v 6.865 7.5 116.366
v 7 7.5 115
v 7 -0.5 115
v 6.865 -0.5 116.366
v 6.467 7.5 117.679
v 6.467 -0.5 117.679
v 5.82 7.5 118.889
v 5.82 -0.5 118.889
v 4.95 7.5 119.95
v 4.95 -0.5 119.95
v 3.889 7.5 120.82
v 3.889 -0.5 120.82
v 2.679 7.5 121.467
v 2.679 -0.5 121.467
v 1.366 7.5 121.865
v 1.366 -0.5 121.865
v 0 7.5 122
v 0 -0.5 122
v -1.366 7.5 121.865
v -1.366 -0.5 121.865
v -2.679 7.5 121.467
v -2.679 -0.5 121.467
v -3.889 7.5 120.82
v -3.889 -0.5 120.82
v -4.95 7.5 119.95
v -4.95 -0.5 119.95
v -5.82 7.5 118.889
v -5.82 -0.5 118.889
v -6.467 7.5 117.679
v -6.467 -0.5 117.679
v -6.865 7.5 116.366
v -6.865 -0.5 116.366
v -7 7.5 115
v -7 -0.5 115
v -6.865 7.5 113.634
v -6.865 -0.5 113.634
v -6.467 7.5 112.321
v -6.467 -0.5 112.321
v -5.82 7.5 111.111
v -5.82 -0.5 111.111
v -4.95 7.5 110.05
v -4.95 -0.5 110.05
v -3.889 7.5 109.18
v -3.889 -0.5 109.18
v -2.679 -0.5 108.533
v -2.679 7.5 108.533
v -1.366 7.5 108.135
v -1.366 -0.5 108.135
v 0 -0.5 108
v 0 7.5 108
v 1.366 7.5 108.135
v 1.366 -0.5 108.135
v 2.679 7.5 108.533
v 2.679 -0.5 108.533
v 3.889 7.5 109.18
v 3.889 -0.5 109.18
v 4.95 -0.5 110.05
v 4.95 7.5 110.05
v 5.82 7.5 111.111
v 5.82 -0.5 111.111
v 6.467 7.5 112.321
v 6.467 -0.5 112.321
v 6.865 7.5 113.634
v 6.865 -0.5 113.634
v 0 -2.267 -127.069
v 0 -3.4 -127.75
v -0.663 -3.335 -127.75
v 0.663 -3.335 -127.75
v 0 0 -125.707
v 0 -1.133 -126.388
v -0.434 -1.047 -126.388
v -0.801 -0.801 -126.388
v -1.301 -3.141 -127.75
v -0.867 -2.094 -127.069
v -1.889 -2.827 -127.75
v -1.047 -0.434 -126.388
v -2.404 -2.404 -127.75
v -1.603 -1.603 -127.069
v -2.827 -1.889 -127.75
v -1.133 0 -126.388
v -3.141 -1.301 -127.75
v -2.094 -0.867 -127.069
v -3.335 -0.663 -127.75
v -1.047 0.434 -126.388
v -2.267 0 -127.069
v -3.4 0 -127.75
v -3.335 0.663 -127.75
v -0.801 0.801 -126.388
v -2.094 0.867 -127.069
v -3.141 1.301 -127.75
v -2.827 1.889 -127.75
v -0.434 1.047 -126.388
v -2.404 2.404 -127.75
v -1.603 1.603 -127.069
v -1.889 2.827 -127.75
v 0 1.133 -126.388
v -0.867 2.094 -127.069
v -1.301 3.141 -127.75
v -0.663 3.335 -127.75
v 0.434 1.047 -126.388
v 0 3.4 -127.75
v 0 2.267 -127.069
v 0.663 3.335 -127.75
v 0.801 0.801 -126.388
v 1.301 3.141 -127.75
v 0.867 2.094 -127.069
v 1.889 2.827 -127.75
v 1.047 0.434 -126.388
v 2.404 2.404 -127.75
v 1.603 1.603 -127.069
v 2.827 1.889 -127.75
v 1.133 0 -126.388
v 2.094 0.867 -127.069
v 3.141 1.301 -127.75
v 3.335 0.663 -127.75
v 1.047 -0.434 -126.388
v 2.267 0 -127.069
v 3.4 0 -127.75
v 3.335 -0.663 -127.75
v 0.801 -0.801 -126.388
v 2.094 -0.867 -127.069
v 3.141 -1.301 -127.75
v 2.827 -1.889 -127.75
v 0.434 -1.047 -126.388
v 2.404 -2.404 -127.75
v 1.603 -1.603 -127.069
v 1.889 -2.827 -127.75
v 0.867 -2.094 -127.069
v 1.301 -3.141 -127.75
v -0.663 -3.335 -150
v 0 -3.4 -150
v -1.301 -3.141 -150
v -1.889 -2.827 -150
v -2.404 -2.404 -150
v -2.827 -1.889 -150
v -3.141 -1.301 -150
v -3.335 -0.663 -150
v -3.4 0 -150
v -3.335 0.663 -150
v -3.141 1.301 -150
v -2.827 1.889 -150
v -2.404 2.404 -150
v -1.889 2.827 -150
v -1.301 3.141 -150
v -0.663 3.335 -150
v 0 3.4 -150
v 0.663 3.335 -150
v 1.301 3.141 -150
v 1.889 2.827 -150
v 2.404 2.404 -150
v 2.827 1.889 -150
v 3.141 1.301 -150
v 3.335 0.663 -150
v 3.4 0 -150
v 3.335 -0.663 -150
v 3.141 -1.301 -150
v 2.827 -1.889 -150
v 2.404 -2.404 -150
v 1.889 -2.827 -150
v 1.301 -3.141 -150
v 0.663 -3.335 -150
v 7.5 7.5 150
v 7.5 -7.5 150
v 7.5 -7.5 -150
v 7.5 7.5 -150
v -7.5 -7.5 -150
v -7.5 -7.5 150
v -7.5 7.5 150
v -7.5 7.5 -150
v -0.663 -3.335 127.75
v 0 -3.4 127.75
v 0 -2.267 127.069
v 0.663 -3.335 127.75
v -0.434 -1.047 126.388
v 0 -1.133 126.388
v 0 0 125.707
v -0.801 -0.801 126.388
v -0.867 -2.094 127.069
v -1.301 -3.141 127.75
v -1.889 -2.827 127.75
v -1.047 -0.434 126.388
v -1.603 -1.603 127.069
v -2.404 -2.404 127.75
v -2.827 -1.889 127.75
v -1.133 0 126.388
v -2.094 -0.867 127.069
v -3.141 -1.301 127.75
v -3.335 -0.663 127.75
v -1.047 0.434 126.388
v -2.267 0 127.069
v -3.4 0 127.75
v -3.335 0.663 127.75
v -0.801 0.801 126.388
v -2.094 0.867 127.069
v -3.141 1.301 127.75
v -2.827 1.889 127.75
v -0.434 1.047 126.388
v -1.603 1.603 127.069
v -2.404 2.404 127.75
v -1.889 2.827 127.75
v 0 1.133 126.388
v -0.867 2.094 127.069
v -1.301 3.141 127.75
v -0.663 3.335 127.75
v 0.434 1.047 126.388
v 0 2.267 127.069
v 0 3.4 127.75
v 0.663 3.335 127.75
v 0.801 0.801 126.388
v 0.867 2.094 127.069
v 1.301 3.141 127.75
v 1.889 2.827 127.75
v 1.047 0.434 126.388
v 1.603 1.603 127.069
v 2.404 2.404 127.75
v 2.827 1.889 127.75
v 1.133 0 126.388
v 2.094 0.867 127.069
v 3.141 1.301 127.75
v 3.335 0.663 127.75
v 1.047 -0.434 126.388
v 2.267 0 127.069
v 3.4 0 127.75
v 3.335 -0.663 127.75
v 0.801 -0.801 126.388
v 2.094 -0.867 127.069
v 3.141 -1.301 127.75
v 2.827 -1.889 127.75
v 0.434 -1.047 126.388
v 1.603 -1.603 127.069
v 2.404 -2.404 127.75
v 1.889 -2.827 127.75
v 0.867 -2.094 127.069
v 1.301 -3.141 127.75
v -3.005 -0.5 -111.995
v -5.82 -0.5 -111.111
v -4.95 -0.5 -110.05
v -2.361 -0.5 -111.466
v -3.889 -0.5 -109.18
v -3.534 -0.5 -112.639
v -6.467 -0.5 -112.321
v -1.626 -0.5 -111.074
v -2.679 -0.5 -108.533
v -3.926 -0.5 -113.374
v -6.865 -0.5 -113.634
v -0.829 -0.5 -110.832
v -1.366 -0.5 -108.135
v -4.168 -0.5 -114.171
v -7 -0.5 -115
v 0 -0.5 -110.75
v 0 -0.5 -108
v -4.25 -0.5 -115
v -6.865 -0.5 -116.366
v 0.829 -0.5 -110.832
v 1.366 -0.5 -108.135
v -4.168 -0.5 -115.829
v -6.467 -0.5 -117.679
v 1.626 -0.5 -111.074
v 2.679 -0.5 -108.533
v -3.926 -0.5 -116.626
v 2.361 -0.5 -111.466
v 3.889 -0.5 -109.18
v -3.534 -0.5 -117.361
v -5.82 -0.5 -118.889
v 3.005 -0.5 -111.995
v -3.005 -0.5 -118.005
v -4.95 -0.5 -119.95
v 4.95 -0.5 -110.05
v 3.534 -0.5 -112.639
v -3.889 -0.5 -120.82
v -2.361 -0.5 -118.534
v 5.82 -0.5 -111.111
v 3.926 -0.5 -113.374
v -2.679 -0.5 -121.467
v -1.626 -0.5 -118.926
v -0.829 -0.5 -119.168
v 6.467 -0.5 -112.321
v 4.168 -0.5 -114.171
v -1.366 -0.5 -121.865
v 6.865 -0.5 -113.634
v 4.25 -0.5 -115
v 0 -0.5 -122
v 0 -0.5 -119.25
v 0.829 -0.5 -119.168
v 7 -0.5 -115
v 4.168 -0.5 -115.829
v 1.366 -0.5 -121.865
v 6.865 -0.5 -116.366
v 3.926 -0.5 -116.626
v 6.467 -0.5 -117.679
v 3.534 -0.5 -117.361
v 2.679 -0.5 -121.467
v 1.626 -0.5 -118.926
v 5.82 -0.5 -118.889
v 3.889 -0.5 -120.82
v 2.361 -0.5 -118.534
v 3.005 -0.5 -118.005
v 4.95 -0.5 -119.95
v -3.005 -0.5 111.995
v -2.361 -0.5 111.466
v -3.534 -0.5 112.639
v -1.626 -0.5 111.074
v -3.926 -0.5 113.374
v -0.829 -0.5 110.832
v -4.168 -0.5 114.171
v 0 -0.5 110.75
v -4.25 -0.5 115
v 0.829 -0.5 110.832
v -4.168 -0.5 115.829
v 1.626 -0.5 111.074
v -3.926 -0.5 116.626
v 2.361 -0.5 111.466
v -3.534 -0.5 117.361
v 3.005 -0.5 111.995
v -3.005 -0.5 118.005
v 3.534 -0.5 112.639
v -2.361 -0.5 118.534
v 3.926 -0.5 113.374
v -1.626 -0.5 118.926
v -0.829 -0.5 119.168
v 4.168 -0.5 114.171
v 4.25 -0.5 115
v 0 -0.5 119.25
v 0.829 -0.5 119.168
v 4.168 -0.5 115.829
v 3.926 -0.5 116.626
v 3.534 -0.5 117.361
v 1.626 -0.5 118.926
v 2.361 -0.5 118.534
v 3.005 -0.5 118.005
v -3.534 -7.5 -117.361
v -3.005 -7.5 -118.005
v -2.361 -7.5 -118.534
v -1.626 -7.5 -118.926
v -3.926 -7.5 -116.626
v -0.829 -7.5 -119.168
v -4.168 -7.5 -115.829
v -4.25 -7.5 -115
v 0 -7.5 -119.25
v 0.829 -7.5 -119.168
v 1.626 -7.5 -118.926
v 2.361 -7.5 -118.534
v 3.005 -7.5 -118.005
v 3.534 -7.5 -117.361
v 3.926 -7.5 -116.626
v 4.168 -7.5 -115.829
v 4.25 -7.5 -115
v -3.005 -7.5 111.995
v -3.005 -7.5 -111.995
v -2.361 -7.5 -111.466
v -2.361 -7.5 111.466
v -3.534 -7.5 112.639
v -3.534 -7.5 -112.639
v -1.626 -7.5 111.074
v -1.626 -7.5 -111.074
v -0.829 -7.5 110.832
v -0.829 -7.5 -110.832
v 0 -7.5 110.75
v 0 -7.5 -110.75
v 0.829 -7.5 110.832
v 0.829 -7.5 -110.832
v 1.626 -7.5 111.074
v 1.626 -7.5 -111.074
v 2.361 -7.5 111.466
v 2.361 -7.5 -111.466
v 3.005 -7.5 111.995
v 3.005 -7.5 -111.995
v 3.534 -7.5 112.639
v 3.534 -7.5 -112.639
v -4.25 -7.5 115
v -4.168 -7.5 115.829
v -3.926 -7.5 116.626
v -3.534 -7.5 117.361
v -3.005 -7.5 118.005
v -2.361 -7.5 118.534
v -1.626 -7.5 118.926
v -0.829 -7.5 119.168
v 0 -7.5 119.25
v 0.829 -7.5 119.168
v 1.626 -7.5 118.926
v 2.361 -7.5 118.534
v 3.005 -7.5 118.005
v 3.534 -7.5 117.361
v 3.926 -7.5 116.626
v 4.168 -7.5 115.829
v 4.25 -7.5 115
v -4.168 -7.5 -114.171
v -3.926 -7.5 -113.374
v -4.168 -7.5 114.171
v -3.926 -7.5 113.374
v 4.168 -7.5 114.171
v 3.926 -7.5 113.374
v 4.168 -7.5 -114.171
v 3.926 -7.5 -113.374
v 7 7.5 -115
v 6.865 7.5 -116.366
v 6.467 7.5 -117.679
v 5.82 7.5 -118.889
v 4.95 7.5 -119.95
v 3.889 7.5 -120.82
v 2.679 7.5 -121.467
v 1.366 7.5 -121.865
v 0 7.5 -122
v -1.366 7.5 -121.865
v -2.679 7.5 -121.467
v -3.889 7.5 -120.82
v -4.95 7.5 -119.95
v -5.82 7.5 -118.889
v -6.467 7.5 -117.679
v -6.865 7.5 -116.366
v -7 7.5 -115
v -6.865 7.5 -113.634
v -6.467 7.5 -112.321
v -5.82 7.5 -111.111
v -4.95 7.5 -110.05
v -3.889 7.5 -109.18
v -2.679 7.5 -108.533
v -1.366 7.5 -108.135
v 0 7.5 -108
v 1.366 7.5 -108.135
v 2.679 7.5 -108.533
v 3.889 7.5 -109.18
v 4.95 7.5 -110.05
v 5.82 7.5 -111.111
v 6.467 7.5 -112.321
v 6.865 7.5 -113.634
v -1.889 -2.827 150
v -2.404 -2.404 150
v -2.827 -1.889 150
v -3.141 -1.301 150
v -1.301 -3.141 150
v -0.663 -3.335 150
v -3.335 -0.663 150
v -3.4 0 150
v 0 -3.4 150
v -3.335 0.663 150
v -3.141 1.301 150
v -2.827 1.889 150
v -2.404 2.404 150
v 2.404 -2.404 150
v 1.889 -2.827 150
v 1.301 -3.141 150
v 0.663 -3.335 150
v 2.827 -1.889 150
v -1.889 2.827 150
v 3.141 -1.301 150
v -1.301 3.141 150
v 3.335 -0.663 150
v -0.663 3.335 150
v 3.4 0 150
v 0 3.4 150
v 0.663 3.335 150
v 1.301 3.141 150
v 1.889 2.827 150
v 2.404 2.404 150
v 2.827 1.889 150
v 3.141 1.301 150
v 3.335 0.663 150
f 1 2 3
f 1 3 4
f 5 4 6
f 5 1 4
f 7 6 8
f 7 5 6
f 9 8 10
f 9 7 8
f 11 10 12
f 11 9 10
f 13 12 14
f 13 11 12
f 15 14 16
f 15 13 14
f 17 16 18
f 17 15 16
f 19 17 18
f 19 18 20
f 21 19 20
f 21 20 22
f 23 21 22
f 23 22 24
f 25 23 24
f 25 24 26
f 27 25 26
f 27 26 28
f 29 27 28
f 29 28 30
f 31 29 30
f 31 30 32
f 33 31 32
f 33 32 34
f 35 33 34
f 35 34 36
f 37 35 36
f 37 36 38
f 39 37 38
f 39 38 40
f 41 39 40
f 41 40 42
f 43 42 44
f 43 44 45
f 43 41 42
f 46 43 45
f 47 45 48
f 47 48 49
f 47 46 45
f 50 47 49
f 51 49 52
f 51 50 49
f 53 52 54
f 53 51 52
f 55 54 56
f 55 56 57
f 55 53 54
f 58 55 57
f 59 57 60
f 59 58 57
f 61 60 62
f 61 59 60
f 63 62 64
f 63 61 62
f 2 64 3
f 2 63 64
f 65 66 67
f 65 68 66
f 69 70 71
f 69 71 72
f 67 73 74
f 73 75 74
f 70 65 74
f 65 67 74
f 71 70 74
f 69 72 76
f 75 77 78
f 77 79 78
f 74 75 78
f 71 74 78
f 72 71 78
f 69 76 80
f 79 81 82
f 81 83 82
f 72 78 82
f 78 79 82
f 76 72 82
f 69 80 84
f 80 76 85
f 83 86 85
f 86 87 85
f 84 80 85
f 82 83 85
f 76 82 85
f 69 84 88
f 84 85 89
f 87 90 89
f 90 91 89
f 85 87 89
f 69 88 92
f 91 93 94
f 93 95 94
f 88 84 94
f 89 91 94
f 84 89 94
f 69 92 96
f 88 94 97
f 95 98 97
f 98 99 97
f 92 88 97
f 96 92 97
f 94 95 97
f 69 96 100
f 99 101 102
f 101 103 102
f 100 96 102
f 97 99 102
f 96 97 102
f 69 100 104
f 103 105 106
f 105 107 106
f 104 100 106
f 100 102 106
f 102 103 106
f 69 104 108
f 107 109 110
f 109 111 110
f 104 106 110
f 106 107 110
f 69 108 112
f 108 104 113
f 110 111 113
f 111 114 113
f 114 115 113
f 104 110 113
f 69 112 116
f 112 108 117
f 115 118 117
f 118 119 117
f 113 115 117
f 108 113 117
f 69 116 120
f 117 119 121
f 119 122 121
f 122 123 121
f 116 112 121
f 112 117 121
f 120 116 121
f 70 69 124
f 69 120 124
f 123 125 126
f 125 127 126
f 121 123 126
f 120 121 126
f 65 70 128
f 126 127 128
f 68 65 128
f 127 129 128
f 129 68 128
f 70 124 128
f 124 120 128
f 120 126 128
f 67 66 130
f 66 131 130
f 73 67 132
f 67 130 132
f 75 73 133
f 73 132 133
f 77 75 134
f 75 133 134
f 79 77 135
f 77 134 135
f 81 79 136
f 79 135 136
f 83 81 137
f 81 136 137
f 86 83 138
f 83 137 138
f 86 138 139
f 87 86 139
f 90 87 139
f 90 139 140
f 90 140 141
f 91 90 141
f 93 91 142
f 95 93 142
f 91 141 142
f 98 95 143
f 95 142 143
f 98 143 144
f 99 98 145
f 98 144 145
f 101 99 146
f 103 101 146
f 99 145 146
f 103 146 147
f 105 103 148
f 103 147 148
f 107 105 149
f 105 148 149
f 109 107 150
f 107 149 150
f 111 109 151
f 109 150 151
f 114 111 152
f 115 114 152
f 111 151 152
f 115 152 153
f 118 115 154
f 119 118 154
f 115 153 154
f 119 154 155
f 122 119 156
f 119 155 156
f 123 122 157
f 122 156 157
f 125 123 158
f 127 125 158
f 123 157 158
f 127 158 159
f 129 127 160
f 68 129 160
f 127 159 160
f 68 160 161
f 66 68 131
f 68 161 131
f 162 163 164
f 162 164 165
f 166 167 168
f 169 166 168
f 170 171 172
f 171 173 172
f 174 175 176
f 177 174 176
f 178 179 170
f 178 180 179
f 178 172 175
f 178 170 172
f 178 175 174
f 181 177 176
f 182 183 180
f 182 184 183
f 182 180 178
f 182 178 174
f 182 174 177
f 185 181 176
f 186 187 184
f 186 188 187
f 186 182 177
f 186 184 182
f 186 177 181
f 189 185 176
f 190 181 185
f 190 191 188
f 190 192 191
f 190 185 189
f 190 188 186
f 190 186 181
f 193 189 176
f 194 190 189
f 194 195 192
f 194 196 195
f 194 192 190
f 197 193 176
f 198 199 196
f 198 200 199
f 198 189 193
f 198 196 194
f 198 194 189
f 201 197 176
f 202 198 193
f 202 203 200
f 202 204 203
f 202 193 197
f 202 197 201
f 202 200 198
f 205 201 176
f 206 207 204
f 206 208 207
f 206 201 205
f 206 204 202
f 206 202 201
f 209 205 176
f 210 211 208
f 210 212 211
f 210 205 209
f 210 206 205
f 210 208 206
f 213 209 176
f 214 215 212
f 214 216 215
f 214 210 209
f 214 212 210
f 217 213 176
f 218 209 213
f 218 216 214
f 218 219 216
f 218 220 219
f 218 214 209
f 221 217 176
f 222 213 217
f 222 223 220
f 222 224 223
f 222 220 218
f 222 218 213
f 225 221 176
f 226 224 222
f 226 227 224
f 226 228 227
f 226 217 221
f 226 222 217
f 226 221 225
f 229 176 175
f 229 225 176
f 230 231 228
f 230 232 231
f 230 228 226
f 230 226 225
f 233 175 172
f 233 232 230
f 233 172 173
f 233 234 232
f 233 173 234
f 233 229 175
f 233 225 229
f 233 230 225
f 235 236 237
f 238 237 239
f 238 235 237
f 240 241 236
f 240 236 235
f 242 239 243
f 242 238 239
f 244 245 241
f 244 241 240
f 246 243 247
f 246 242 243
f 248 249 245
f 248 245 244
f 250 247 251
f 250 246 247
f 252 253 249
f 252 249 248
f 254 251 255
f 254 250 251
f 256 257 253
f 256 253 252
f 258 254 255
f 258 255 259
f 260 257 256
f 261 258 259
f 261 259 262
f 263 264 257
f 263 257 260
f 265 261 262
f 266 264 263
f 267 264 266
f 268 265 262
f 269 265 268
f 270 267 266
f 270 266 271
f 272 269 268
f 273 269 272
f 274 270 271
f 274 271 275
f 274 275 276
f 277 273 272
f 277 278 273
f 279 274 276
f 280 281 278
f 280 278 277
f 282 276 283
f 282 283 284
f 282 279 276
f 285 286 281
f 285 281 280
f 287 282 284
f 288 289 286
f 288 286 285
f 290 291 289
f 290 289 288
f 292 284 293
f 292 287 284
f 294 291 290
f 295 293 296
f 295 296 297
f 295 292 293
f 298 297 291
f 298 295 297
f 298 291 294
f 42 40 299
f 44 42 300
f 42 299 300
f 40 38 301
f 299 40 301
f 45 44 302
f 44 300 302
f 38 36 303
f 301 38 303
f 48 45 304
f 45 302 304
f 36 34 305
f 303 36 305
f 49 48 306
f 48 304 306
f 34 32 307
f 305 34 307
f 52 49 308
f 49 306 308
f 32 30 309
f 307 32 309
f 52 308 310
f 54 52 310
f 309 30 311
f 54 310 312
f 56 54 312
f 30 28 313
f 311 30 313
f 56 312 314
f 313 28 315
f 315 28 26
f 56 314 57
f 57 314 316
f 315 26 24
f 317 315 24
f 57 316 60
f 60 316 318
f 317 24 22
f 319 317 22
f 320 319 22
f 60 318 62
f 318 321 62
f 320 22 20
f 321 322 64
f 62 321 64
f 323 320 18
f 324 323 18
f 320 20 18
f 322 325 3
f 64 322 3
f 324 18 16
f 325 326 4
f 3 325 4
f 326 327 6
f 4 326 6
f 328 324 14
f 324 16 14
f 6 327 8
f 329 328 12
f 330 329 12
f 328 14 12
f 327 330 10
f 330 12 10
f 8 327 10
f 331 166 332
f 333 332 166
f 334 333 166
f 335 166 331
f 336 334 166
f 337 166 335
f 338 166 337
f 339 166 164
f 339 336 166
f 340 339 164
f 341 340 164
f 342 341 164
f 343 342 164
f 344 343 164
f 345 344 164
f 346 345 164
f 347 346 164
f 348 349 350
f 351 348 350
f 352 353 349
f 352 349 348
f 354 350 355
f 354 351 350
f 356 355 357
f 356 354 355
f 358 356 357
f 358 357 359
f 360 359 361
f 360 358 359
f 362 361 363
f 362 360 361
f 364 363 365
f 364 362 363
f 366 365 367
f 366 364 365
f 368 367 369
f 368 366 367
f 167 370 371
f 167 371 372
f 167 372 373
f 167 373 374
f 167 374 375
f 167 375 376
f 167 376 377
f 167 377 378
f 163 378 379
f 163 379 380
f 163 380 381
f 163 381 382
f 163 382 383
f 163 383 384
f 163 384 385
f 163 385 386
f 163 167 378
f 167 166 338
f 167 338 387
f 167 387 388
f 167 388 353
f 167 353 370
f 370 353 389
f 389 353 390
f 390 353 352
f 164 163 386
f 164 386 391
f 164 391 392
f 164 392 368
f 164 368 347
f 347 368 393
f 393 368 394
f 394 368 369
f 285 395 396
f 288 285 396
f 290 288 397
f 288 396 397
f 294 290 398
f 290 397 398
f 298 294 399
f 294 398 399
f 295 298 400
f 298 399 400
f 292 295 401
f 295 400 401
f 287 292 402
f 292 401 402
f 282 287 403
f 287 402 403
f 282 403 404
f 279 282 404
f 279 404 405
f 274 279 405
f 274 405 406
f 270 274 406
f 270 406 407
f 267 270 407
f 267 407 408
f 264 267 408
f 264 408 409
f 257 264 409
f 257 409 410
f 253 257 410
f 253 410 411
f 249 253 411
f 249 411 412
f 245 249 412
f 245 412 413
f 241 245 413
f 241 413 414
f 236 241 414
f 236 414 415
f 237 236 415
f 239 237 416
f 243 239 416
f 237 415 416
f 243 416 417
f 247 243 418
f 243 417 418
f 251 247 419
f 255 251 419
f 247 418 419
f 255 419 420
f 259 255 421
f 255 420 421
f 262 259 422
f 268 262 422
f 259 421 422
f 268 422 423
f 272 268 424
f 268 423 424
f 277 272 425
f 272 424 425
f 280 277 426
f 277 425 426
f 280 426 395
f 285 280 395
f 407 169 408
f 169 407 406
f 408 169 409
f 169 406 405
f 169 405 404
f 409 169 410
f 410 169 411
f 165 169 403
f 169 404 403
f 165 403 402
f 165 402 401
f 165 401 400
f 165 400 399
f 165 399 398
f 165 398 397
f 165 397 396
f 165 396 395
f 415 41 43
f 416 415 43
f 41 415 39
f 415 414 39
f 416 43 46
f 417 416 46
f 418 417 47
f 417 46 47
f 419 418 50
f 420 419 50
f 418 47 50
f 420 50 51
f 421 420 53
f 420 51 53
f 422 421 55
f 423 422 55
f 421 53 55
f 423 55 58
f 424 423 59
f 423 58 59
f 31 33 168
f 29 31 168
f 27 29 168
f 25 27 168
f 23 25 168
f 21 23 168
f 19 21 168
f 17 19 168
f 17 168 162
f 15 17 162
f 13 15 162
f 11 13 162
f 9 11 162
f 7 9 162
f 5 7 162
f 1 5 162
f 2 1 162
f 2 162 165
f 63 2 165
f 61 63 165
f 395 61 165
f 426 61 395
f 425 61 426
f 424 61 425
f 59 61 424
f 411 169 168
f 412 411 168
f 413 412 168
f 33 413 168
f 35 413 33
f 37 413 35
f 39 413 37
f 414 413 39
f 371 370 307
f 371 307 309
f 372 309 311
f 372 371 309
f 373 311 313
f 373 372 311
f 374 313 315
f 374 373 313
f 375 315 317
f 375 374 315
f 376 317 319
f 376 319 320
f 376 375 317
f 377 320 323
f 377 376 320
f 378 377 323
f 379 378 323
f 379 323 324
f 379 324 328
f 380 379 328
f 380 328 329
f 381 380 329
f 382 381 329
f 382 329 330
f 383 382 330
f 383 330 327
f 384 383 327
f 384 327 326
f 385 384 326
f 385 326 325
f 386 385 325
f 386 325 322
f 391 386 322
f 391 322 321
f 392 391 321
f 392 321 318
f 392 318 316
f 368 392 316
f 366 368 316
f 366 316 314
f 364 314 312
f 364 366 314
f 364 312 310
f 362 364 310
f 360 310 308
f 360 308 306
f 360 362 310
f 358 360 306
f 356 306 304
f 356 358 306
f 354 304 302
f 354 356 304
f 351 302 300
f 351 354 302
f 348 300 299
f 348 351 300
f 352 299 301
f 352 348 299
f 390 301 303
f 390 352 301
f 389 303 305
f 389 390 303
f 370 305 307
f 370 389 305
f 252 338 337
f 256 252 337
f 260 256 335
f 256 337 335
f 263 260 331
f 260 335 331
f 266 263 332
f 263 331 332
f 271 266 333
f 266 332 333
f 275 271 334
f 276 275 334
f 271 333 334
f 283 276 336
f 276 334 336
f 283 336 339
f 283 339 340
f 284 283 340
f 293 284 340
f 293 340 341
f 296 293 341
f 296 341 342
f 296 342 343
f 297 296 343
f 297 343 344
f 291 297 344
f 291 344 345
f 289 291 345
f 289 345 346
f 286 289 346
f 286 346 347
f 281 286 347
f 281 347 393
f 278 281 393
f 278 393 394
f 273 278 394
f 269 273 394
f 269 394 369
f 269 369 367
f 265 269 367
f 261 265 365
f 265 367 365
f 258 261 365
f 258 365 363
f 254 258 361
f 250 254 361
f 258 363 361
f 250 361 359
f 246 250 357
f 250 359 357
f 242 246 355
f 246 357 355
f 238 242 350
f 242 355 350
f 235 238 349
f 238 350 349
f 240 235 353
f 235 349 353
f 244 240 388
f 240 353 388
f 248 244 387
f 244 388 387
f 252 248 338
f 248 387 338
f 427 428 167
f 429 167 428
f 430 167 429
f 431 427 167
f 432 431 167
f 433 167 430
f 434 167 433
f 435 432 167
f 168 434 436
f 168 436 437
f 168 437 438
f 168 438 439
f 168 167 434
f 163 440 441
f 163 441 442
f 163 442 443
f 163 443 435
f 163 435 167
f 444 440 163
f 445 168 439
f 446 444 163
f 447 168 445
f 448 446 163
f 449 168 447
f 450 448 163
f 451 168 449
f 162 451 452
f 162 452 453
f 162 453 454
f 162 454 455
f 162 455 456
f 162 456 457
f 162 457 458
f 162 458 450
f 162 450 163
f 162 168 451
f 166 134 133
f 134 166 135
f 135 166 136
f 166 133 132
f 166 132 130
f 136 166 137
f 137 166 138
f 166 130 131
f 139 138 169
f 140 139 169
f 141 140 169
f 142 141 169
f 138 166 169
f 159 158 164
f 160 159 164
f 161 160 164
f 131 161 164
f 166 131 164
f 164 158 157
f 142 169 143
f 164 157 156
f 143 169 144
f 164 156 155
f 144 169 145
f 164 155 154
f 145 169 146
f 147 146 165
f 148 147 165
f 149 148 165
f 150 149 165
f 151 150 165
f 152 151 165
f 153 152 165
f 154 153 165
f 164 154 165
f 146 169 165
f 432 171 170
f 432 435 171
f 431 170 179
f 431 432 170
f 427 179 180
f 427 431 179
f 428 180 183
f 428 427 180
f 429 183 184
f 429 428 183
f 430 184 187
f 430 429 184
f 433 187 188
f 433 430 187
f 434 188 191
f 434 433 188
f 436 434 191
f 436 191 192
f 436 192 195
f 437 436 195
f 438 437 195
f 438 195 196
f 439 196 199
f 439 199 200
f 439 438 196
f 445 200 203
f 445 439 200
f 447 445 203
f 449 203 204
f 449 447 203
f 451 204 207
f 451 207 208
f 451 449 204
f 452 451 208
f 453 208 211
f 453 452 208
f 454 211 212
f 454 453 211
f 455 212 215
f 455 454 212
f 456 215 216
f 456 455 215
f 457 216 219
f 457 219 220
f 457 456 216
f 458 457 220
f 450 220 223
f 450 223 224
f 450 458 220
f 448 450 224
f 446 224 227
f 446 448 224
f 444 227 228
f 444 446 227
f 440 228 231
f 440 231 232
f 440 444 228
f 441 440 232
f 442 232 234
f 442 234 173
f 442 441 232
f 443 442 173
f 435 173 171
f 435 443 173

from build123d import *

# Parameters (mm, degrees)
IZIM1_W                     = 15
IZIM1_H                     = 15
Y_KSEKLIK_EKSTR_ZYON1_DEPTH = 150
DELIK1_D                    = 8.5
DELIK1_DEPTH                = 15
DELIK1_CBORE_D              = 14
DELIK1_CBORE_DEPTH          = 8


with BuildPart() as part:
    # Çizim1 → Yükseklik-Ekstrüzyon1 (new body, symmetric)
    with BuildSketch(Plane.XY):
        Rectangle(IZIM1_W, IZIM1_H)
    extrude(amount=Y_KSEKLIK_EKSTR_ZYON1_DEPTH, both=True)

    # Çizim3 → M8 Dişli Delik1 (revolve, cut)
    with BuildSketch(Plane(origin=(0, 0, 150), x_dir=(0, -1, 0), z_dir=(1, 0, 0))):
        Polygon((0, 0), (0, 24.292926105), (3.4, 22.25), (3.4, 0), align=None)
    m8_di_li_delik1 = revolve(axis=Axis((0, 0, 156.35), (0, 0, -1)), mode=Mode.SUBTRACT)

    # Aynalama1: M8 Dişli Delik1 across plane
    add(m8_di_li_delik1.mirror(Plane.XY), mode=Mode.SUBTRACT)

    # Delik1
    with Locations(Plane(origin=(0, 7.5, 0), x_dir=(1, 0, 0), z_dir=(0, 1, 0))):
        with Locations((0, 115)):
            delik1 = CounterBoreHole(DELIK1_D / 2, DELIK1_CBORE_D / 2, DELIK1_CBORE_DEPTH, depth=DELIK1_DEPTH)

    # Aynalama2: Delik1 across plane
    add(delik1.mirror(Plane.XY), mode=Mode.SUBTRACT)


solid = part.part
